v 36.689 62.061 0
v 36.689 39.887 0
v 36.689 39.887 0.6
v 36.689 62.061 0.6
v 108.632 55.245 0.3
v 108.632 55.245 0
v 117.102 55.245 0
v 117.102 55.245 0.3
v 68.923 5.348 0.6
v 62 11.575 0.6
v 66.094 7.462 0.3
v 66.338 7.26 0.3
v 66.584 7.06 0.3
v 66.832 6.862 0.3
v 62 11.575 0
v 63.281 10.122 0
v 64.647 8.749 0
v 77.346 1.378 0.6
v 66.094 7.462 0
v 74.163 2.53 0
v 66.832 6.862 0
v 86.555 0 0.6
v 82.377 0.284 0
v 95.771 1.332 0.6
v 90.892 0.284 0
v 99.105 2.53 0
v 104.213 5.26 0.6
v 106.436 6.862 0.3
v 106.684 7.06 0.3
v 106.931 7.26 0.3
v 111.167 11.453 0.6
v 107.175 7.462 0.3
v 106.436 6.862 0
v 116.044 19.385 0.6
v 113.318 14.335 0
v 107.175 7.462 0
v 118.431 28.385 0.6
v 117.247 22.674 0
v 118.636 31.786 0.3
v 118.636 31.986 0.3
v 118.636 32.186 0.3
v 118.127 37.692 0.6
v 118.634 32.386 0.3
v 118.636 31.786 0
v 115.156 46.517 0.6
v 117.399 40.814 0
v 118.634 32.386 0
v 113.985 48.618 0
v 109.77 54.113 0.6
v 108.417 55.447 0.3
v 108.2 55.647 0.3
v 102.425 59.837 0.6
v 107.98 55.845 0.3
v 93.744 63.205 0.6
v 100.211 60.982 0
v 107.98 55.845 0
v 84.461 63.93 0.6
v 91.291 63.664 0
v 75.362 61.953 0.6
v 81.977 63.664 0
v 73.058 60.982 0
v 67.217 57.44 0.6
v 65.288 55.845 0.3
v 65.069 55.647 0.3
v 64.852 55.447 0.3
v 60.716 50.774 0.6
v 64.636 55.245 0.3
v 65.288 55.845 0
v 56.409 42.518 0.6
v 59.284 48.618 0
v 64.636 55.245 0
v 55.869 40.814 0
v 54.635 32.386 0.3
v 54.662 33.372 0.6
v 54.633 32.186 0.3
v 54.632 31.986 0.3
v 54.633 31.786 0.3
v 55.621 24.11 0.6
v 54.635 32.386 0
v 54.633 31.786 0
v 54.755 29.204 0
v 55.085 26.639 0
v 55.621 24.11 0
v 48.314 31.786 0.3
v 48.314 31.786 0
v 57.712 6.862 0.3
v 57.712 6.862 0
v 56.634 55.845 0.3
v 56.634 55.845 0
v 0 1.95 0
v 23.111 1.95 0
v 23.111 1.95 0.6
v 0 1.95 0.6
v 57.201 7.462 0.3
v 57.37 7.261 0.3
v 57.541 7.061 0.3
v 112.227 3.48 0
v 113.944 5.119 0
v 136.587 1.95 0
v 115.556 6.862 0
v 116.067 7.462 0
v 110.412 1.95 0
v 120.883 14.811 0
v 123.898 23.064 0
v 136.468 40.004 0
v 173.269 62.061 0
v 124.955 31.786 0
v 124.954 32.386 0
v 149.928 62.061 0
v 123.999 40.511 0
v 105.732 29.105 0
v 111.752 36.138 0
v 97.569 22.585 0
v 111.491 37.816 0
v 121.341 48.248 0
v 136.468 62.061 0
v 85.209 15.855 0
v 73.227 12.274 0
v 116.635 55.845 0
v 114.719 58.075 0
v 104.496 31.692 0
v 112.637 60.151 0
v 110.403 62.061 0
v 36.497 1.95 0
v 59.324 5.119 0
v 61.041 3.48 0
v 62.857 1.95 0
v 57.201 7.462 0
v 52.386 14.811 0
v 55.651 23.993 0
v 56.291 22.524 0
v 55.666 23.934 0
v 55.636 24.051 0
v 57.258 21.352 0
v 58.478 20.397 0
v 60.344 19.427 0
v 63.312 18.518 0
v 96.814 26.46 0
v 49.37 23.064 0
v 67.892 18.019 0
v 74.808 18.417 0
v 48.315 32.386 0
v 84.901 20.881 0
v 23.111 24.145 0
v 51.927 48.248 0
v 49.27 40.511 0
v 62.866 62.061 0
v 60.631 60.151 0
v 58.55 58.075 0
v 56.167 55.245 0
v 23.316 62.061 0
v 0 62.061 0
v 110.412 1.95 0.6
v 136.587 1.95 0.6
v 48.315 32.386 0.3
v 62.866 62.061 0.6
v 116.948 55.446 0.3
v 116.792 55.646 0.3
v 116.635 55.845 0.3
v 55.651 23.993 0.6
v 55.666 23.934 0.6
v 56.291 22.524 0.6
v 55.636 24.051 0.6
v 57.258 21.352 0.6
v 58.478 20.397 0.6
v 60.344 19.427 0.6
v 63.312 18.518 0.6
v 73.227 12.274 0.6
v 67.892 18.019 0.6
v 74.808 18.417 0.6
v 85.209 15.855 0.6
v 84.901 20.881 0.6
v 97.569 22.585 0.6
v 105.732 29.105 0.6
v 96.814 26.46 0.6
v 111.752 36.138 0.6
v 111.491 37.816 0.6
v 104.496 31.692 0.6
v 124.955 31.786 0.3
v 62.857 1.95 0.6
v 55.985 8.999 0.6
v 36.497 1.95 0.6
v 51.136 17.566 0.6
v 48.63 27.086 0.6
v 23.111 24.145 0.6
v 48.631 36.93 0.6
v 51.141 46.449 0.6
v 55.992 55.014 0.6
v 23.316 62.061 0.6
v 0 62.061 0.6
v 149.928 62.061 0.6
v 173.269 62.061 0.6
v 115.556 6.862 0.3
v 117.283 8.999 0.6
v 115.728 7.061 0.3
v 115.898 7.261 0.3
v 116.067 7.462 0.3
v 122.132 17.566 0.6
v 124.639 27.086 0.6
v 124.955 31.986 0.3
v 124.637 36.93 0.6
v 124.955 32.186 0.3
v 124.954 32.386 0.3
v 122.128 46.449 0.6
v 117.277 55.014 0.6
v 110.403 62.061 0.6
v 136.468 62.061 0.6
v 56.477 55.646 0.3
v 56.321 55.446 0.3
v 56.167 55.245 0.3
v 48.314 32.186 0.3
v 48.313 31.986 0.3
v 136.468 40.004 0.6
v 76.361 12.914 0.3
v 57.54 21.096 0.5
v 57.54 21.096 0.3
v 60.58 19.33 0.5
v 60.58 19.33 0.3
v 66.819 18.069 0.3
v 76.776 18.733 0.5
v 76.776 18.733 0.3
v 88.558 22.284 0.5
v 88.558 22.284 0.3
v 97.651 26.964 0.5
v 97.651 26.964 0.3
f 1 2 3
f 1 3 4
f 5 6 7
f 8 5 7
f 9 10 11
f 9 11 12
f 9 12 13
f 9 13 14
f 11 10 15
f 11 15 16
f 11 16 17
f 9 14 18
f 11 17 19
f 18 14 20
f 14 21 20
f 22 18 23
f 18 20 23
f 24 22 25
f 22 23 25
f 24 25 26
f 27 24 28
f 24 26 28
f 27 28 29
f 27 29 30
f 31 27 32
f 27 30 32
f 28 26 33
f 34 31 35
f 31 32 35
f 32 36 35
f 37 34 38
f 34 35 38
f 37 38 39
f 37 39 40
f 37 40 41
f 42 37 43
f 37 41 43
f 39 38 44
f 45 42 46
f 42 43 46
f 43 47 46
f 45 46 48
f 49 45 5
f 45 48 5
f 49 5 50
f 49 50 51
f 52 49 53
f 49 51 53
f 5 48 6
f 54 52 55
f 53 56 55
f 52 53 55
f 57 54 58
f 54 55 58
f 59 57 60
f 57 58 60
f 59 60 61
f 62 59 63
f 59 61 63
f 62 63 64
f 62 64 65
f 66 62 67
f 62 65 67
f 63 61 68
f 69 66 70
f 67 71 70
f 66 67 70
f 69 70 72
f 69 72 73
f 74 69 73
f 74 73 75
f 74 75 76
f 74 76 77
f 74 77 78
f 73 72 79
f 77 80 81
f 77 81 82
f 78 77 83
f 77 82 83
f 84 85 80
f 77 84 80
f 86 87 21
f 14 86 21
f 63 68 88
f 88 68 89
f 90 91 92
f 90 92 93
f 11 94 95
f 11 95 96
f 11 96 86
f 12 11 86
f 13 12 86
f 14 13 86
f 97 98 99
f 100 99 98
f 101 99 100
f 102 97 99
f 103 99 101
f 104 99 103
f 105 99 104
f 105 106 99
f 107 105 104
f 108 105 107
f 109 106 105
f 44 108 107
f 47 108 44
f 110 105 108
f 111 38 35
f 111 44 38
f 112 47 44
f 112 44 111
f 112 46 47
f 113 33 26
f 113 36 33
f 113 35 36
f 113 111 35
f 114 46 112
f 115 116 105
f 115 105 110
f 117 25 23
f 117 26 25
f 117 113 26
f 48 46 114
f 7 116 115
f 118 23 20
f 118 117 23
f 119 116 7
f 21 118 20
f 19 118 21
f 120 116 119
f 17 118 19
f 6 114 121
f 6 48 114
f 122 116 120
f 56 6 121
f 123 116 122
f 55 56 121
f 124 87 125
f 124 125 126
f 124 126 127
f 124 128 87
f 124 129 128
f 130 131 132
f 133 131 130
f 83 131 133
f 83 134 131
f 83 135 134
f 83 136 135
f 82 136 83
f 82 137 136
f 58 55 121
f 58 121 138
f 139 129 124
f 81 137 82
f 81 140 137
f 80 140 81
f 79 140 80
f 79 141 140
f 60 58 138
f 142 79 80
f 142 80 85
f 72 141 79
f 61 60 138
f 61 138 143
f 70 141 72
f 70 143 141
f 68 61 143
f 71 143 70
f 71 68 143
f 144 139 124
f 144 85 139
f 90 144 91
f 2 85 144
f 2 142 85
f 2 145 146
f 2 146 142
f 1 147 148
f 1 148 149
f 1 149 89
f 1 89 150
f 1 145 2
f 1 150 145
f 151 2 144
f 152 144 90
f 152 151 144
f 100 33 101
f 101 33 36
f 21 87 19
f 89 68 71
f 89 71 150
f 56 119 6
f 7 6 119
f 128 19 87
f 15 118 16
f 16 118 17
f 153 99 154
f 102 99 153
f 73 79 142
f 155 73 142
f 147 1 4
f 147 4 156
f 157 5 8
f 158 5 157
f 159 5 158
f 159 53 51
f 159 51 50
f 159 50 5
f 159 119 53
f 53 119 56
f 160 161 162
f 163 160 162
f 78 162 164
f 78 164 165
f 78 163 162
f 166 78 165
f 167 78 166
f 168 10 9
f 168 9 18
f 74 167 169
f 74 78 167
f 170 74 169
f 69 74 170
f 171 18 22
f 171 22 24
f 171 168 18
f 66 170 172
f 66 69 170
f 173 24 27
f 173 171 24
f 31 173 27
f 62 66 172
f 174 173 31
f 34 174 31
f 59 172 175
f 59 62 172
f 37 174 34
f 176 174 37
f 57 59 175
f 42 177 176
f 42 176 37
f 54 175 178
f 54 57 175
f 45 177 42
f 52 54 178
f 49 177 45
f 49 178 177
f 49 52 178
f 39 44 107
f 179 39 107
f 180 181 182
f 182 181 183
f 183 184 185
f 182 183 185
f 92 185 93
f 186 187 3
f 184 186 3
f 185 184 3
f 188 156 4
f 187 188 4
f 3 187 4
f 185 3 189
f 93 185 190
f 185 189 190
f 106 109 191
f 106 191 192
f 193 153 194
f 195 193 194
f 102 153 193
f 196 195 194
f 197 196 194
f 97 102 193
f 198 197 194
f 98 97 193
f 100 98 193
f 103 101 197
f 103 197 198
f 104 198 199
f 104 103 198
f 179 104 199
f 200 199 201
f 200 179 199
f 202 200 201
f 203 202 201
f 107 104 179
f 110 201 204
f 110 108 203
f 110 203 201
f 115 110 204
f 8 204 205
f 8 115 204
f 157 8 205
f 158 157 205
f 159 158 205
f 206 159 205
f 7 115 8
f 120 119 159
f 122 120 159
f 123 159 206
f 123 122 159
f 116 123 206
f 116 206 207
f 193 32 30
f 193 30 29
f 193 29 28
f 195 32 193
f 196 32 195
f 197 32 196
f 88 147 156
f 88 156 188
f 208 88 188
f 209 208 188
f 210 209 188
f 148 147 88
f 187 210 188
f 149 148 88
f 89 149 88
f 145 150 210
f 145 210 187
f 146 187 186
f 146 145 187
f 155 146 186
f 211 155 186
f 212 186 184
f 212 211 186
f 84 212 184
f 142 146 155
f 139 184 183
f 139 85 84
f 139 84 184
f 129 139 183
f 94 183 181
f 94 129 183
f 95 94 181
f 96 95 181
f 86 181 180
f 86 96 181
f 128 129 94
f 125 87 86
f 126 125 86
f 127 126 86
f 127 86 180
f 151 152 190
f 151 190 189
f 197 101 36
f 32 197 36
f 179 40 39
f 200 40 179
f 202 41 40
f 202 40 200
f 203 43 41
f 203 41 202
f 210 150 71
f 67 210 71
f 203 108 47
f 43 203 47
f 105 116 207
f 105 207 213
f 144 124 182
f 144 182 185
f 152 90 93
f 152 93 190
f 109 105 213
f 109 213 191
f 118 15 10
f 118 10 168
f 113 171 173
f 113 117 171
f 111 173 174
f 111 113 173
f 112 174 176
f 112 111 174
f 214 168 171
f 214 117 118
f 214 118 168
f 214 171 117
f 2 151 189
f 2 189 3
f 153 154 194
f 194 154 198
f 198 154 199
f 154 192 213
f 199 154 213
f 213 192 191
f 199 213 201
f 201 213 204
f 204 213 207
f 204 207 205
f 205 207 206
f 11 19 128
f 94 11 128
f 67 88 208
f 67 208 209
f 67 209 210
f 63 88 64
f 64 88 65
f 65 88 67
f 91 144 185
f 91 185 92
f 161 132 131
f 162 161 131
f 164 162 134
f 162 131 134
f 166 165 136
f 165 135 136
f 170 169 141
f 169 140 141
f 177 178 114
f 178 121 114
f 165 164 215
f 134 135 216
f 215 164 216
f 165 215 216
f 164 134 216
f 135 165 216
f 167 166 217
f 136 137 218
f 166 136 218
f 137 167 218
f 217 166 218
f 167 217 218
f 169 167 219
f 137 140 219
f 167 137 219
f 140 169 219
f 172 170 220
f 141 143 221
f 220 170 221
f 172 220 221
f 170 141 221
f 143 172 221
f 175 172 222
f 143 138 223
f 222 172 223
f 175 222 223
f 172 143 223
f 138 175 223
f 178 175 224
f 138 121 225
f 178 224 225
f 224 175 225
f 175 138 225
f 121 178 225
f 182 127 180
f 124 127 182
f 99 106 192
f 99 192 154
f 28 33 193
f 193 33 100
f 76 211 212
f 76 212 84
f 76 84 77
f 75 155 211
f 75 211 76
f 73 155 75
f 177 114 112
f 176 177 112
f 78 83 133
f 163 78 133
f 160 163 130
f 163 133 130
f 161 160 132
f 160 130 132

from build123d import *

# Parameters (mm, degrees)
BOSS_EXTRUDE1_DEPTH   = 0.6
BOSS_EXTRUDE1_2_DEPTH = 0.6
BOSS_EXTRUDE1_3_DEPTH = 0.6
BOSS_EXTRUDE2_DEPTH   = 0.3


with BuildPart() as part:
    # Sketch1 → Boss-Extrude1 (new body)
    with BuildSketch(Plane.XY):
        with BuildLine():
            ThreePointArc((62.865529661, 62.061281034), (48.313215527, 32.007787602), (62.856663932, 1.950002877))
            Line((62.856663932, 1.950002877), (36.497449361, 1.950002877))
            Line((36.497449361, 1.950002877), (23.111234398, 24.145438461))
            Line((23.111234398, 24.145438461), (23.111234398, 1.950002877))
            Line((23.111234398, 1.950002877), (0, 1.950002877))
            Line((0, 1.950002877), (0, 62.061281034))
            Line((0, 62.061281034), (23.3158368, 62.061281034))
            Line((23.3158368, 62.061281034), (36.689087616, 39.887341061))
            Line((36.689087616, 39.887341061), (36.689087616, 62.061281034))
            Line((36.689087616, 62.061281034), (62.865529661, 62.061281034))
        make_face()
    extrude(amount=BOSS_EXTRUDE1_DEPTH)



with BuildPart() as body_2:
    # Sketch1 → Boss-Extrude1 2 (new body)
    with BuildSketch(Plane.XY):
        with BuildLine():
            add(Edge.make_bspline(
                [(55.665817619, 23.934470135), (56.300995164, 21.632545966), (60.312610701, 18.883485306), (68.000137108, 17.687938813), (77.626036713, 18.475223123), (88.050691987, 21.709552098), (99.970855751, 27.901244554), (107.303663525, 33.692026699), (111.490621497, 37.816257369)],
                knots=[0.00273107, 0.00273107, 0.00273107, 0.00273107, 0.111443696, 0.211566761, 0.368518187, 0.562067367, 0.722926062, 1, 1, 1, 1], degree=3))
            Line((111.490621497, 37.816257369), (111.75160581, 36.138246697))
            add(Edge.make_bspline(
                [(61.999805678, 11.574793615), (65.651806063, 11.384741592), (84.022958412, 12.171806498), (105.244079008, 26.24652902), (111.75160581, 36.138246697)],
                knots=[0, 0, 0, 0, 0.285157646, 1, 1, 1, 1], degree=3))
            ThreePointArc((61.999805678, 11.574793615), (115.155551398, 46.516849232), (55.620719661, 24.109610138))
            ThreePointArc((55.620719661, 24.109610138), (55.643144919, 24.022008279), (55.665817619, 23.934470135))
        make_face()
    extrude(amount=BOSS_EXTRUDE1_2_DEPTH)


with BuildPart() as body_3:
    # Sketch1 → Boss-Extrude1 3 (new body)
    with BuildSketch(Plane.XY):
        with BuildLine():
            ThreePointArc((110.412012767, 1.950002877), (124.955461171, 32.007787602), (110.403147038, 62.061281034))
            Line((110.403147038, 62.061281034), (136.46819788, 62.061281034))
            Line((136.46819788, 62.061281034), (136.46819788, 40.00376678))
            Line((136.46819788, 40.00376678), (149.928389856, 62.061281034))
            Line((149.928389856, 62.061281034), (173.268679959, 62.061281034))
            Line((173.268679959, 62.061281034), (136.586879163, 1.950002877))
            Line((136.586879163, 1.950002877), (110.412012767, 1.950002877))
        make_face()
    extrude(amount=BOSS_EXTRUDE1_3_DEPTH)


with BuildPart() as part_1:
    add(part.part)

    add(body_2.part)  # Boss-Extrude2 merges body 2

    add(body_3.part)  # Boss-Extrude2 merges body 3
    # Sketch2 → Boss-Extrude2 (add)
    with BuildSketch(Plane.XY):
        with BuildLine():
            Line((65.288187558, 55.844919694), (56.63383608, 55.844919694))
            ThreePointArc((56.63383608, 55.844919694), (56.398742844, 55.546078646), (56.166626305, 55.244919694))
            Line((56.166626305, 55.244919694), (64.63639539, 55.244919694))
            ThreePointArc((64.63639539, 55.244919694), (64.960215166, 55.547175229), (65.288187558, 55.844919694))
        make_face()
        with BuildLine():
            Line((66.093618581, 7.462059575), (57.201479987, 7.462059575))
            ThreePointArc((57.201479987, 7.462059575), (57.455341197, 7.160746592), (57.7122869, 6.862059575))
            Line((57.7122869, 6.862059575), (66.83249305, 6.862059575))
            ThreePointArc((66.83249305, 6.862059575), (66.460825045, 7.159312475), (66.093618581, 7.462059575))
        make_face()
        with BuildLine():
            Line((54.634511424, 32.386297359), (48.315140731, 32.386297359))
            ThreePointArc((48.315140731, 32.386297359), (48.313307535, 32.086299938), (48.313822955, 31.786297359))
            Line((48.313822955, 31.786297359), (54.632933422, 31.786297359))
            ThreePointArc((54.632933422, 31.786297359), (54.632316231, 32.086301058), (54.634511424, 32.386297359))
        make_face()
        with BuildLine():
            Line((116.067196712, 7.462059575), (107.175058117, 7.462059575))
            ThreePointArc((107.175058117, 7.462059575), (106.807851654, 7.159312475), (106.436183649, 6.862059575))
            Line((106.436183649, 6.862059575), (115.556389799, 6.862059575))
            ThreePointArc((115.556389799, 6.862059575), (115.813335501, 7.160746592), (116.067196712, 7.462059575))
        make_face()
        with BuildLine():
            Line((124.953535967, 32.386297359), (118.634165275, 32.386297359))
            ThreePointArc((118.634165275, 32.386297359), (118.636360468, 32.086301058), (118.635743276, 31.786297359))
            Line((118.635743276, 31.786297359), (124.954853744, 31.786297359))
            ThreePointArc((124.954853744, 31.786297359), (124.955369164, 32.086299938), (124.953535967, 32.386297359))
        make_face()
        with BuildLine():
            Line((116.634840619, 55.844919694), (107.980489141, 55.844919694))
            ThreePointArc((107.980489141, 55.844919694), (108.308461533, 55.547175229), (108.632281309, 55.244919694))
            Line((108.632281309, 55.244919694), (117.102050394, 55.244919694))
            ThreePointArc((117.102050394, 55.244919694), (116.869933855, 55.546078646), (116.634840619, 55.844919694))
        make_face()
    extrude(amount=BOSS_EXTRUDE2_DEPTH)


solid = part_1.part
